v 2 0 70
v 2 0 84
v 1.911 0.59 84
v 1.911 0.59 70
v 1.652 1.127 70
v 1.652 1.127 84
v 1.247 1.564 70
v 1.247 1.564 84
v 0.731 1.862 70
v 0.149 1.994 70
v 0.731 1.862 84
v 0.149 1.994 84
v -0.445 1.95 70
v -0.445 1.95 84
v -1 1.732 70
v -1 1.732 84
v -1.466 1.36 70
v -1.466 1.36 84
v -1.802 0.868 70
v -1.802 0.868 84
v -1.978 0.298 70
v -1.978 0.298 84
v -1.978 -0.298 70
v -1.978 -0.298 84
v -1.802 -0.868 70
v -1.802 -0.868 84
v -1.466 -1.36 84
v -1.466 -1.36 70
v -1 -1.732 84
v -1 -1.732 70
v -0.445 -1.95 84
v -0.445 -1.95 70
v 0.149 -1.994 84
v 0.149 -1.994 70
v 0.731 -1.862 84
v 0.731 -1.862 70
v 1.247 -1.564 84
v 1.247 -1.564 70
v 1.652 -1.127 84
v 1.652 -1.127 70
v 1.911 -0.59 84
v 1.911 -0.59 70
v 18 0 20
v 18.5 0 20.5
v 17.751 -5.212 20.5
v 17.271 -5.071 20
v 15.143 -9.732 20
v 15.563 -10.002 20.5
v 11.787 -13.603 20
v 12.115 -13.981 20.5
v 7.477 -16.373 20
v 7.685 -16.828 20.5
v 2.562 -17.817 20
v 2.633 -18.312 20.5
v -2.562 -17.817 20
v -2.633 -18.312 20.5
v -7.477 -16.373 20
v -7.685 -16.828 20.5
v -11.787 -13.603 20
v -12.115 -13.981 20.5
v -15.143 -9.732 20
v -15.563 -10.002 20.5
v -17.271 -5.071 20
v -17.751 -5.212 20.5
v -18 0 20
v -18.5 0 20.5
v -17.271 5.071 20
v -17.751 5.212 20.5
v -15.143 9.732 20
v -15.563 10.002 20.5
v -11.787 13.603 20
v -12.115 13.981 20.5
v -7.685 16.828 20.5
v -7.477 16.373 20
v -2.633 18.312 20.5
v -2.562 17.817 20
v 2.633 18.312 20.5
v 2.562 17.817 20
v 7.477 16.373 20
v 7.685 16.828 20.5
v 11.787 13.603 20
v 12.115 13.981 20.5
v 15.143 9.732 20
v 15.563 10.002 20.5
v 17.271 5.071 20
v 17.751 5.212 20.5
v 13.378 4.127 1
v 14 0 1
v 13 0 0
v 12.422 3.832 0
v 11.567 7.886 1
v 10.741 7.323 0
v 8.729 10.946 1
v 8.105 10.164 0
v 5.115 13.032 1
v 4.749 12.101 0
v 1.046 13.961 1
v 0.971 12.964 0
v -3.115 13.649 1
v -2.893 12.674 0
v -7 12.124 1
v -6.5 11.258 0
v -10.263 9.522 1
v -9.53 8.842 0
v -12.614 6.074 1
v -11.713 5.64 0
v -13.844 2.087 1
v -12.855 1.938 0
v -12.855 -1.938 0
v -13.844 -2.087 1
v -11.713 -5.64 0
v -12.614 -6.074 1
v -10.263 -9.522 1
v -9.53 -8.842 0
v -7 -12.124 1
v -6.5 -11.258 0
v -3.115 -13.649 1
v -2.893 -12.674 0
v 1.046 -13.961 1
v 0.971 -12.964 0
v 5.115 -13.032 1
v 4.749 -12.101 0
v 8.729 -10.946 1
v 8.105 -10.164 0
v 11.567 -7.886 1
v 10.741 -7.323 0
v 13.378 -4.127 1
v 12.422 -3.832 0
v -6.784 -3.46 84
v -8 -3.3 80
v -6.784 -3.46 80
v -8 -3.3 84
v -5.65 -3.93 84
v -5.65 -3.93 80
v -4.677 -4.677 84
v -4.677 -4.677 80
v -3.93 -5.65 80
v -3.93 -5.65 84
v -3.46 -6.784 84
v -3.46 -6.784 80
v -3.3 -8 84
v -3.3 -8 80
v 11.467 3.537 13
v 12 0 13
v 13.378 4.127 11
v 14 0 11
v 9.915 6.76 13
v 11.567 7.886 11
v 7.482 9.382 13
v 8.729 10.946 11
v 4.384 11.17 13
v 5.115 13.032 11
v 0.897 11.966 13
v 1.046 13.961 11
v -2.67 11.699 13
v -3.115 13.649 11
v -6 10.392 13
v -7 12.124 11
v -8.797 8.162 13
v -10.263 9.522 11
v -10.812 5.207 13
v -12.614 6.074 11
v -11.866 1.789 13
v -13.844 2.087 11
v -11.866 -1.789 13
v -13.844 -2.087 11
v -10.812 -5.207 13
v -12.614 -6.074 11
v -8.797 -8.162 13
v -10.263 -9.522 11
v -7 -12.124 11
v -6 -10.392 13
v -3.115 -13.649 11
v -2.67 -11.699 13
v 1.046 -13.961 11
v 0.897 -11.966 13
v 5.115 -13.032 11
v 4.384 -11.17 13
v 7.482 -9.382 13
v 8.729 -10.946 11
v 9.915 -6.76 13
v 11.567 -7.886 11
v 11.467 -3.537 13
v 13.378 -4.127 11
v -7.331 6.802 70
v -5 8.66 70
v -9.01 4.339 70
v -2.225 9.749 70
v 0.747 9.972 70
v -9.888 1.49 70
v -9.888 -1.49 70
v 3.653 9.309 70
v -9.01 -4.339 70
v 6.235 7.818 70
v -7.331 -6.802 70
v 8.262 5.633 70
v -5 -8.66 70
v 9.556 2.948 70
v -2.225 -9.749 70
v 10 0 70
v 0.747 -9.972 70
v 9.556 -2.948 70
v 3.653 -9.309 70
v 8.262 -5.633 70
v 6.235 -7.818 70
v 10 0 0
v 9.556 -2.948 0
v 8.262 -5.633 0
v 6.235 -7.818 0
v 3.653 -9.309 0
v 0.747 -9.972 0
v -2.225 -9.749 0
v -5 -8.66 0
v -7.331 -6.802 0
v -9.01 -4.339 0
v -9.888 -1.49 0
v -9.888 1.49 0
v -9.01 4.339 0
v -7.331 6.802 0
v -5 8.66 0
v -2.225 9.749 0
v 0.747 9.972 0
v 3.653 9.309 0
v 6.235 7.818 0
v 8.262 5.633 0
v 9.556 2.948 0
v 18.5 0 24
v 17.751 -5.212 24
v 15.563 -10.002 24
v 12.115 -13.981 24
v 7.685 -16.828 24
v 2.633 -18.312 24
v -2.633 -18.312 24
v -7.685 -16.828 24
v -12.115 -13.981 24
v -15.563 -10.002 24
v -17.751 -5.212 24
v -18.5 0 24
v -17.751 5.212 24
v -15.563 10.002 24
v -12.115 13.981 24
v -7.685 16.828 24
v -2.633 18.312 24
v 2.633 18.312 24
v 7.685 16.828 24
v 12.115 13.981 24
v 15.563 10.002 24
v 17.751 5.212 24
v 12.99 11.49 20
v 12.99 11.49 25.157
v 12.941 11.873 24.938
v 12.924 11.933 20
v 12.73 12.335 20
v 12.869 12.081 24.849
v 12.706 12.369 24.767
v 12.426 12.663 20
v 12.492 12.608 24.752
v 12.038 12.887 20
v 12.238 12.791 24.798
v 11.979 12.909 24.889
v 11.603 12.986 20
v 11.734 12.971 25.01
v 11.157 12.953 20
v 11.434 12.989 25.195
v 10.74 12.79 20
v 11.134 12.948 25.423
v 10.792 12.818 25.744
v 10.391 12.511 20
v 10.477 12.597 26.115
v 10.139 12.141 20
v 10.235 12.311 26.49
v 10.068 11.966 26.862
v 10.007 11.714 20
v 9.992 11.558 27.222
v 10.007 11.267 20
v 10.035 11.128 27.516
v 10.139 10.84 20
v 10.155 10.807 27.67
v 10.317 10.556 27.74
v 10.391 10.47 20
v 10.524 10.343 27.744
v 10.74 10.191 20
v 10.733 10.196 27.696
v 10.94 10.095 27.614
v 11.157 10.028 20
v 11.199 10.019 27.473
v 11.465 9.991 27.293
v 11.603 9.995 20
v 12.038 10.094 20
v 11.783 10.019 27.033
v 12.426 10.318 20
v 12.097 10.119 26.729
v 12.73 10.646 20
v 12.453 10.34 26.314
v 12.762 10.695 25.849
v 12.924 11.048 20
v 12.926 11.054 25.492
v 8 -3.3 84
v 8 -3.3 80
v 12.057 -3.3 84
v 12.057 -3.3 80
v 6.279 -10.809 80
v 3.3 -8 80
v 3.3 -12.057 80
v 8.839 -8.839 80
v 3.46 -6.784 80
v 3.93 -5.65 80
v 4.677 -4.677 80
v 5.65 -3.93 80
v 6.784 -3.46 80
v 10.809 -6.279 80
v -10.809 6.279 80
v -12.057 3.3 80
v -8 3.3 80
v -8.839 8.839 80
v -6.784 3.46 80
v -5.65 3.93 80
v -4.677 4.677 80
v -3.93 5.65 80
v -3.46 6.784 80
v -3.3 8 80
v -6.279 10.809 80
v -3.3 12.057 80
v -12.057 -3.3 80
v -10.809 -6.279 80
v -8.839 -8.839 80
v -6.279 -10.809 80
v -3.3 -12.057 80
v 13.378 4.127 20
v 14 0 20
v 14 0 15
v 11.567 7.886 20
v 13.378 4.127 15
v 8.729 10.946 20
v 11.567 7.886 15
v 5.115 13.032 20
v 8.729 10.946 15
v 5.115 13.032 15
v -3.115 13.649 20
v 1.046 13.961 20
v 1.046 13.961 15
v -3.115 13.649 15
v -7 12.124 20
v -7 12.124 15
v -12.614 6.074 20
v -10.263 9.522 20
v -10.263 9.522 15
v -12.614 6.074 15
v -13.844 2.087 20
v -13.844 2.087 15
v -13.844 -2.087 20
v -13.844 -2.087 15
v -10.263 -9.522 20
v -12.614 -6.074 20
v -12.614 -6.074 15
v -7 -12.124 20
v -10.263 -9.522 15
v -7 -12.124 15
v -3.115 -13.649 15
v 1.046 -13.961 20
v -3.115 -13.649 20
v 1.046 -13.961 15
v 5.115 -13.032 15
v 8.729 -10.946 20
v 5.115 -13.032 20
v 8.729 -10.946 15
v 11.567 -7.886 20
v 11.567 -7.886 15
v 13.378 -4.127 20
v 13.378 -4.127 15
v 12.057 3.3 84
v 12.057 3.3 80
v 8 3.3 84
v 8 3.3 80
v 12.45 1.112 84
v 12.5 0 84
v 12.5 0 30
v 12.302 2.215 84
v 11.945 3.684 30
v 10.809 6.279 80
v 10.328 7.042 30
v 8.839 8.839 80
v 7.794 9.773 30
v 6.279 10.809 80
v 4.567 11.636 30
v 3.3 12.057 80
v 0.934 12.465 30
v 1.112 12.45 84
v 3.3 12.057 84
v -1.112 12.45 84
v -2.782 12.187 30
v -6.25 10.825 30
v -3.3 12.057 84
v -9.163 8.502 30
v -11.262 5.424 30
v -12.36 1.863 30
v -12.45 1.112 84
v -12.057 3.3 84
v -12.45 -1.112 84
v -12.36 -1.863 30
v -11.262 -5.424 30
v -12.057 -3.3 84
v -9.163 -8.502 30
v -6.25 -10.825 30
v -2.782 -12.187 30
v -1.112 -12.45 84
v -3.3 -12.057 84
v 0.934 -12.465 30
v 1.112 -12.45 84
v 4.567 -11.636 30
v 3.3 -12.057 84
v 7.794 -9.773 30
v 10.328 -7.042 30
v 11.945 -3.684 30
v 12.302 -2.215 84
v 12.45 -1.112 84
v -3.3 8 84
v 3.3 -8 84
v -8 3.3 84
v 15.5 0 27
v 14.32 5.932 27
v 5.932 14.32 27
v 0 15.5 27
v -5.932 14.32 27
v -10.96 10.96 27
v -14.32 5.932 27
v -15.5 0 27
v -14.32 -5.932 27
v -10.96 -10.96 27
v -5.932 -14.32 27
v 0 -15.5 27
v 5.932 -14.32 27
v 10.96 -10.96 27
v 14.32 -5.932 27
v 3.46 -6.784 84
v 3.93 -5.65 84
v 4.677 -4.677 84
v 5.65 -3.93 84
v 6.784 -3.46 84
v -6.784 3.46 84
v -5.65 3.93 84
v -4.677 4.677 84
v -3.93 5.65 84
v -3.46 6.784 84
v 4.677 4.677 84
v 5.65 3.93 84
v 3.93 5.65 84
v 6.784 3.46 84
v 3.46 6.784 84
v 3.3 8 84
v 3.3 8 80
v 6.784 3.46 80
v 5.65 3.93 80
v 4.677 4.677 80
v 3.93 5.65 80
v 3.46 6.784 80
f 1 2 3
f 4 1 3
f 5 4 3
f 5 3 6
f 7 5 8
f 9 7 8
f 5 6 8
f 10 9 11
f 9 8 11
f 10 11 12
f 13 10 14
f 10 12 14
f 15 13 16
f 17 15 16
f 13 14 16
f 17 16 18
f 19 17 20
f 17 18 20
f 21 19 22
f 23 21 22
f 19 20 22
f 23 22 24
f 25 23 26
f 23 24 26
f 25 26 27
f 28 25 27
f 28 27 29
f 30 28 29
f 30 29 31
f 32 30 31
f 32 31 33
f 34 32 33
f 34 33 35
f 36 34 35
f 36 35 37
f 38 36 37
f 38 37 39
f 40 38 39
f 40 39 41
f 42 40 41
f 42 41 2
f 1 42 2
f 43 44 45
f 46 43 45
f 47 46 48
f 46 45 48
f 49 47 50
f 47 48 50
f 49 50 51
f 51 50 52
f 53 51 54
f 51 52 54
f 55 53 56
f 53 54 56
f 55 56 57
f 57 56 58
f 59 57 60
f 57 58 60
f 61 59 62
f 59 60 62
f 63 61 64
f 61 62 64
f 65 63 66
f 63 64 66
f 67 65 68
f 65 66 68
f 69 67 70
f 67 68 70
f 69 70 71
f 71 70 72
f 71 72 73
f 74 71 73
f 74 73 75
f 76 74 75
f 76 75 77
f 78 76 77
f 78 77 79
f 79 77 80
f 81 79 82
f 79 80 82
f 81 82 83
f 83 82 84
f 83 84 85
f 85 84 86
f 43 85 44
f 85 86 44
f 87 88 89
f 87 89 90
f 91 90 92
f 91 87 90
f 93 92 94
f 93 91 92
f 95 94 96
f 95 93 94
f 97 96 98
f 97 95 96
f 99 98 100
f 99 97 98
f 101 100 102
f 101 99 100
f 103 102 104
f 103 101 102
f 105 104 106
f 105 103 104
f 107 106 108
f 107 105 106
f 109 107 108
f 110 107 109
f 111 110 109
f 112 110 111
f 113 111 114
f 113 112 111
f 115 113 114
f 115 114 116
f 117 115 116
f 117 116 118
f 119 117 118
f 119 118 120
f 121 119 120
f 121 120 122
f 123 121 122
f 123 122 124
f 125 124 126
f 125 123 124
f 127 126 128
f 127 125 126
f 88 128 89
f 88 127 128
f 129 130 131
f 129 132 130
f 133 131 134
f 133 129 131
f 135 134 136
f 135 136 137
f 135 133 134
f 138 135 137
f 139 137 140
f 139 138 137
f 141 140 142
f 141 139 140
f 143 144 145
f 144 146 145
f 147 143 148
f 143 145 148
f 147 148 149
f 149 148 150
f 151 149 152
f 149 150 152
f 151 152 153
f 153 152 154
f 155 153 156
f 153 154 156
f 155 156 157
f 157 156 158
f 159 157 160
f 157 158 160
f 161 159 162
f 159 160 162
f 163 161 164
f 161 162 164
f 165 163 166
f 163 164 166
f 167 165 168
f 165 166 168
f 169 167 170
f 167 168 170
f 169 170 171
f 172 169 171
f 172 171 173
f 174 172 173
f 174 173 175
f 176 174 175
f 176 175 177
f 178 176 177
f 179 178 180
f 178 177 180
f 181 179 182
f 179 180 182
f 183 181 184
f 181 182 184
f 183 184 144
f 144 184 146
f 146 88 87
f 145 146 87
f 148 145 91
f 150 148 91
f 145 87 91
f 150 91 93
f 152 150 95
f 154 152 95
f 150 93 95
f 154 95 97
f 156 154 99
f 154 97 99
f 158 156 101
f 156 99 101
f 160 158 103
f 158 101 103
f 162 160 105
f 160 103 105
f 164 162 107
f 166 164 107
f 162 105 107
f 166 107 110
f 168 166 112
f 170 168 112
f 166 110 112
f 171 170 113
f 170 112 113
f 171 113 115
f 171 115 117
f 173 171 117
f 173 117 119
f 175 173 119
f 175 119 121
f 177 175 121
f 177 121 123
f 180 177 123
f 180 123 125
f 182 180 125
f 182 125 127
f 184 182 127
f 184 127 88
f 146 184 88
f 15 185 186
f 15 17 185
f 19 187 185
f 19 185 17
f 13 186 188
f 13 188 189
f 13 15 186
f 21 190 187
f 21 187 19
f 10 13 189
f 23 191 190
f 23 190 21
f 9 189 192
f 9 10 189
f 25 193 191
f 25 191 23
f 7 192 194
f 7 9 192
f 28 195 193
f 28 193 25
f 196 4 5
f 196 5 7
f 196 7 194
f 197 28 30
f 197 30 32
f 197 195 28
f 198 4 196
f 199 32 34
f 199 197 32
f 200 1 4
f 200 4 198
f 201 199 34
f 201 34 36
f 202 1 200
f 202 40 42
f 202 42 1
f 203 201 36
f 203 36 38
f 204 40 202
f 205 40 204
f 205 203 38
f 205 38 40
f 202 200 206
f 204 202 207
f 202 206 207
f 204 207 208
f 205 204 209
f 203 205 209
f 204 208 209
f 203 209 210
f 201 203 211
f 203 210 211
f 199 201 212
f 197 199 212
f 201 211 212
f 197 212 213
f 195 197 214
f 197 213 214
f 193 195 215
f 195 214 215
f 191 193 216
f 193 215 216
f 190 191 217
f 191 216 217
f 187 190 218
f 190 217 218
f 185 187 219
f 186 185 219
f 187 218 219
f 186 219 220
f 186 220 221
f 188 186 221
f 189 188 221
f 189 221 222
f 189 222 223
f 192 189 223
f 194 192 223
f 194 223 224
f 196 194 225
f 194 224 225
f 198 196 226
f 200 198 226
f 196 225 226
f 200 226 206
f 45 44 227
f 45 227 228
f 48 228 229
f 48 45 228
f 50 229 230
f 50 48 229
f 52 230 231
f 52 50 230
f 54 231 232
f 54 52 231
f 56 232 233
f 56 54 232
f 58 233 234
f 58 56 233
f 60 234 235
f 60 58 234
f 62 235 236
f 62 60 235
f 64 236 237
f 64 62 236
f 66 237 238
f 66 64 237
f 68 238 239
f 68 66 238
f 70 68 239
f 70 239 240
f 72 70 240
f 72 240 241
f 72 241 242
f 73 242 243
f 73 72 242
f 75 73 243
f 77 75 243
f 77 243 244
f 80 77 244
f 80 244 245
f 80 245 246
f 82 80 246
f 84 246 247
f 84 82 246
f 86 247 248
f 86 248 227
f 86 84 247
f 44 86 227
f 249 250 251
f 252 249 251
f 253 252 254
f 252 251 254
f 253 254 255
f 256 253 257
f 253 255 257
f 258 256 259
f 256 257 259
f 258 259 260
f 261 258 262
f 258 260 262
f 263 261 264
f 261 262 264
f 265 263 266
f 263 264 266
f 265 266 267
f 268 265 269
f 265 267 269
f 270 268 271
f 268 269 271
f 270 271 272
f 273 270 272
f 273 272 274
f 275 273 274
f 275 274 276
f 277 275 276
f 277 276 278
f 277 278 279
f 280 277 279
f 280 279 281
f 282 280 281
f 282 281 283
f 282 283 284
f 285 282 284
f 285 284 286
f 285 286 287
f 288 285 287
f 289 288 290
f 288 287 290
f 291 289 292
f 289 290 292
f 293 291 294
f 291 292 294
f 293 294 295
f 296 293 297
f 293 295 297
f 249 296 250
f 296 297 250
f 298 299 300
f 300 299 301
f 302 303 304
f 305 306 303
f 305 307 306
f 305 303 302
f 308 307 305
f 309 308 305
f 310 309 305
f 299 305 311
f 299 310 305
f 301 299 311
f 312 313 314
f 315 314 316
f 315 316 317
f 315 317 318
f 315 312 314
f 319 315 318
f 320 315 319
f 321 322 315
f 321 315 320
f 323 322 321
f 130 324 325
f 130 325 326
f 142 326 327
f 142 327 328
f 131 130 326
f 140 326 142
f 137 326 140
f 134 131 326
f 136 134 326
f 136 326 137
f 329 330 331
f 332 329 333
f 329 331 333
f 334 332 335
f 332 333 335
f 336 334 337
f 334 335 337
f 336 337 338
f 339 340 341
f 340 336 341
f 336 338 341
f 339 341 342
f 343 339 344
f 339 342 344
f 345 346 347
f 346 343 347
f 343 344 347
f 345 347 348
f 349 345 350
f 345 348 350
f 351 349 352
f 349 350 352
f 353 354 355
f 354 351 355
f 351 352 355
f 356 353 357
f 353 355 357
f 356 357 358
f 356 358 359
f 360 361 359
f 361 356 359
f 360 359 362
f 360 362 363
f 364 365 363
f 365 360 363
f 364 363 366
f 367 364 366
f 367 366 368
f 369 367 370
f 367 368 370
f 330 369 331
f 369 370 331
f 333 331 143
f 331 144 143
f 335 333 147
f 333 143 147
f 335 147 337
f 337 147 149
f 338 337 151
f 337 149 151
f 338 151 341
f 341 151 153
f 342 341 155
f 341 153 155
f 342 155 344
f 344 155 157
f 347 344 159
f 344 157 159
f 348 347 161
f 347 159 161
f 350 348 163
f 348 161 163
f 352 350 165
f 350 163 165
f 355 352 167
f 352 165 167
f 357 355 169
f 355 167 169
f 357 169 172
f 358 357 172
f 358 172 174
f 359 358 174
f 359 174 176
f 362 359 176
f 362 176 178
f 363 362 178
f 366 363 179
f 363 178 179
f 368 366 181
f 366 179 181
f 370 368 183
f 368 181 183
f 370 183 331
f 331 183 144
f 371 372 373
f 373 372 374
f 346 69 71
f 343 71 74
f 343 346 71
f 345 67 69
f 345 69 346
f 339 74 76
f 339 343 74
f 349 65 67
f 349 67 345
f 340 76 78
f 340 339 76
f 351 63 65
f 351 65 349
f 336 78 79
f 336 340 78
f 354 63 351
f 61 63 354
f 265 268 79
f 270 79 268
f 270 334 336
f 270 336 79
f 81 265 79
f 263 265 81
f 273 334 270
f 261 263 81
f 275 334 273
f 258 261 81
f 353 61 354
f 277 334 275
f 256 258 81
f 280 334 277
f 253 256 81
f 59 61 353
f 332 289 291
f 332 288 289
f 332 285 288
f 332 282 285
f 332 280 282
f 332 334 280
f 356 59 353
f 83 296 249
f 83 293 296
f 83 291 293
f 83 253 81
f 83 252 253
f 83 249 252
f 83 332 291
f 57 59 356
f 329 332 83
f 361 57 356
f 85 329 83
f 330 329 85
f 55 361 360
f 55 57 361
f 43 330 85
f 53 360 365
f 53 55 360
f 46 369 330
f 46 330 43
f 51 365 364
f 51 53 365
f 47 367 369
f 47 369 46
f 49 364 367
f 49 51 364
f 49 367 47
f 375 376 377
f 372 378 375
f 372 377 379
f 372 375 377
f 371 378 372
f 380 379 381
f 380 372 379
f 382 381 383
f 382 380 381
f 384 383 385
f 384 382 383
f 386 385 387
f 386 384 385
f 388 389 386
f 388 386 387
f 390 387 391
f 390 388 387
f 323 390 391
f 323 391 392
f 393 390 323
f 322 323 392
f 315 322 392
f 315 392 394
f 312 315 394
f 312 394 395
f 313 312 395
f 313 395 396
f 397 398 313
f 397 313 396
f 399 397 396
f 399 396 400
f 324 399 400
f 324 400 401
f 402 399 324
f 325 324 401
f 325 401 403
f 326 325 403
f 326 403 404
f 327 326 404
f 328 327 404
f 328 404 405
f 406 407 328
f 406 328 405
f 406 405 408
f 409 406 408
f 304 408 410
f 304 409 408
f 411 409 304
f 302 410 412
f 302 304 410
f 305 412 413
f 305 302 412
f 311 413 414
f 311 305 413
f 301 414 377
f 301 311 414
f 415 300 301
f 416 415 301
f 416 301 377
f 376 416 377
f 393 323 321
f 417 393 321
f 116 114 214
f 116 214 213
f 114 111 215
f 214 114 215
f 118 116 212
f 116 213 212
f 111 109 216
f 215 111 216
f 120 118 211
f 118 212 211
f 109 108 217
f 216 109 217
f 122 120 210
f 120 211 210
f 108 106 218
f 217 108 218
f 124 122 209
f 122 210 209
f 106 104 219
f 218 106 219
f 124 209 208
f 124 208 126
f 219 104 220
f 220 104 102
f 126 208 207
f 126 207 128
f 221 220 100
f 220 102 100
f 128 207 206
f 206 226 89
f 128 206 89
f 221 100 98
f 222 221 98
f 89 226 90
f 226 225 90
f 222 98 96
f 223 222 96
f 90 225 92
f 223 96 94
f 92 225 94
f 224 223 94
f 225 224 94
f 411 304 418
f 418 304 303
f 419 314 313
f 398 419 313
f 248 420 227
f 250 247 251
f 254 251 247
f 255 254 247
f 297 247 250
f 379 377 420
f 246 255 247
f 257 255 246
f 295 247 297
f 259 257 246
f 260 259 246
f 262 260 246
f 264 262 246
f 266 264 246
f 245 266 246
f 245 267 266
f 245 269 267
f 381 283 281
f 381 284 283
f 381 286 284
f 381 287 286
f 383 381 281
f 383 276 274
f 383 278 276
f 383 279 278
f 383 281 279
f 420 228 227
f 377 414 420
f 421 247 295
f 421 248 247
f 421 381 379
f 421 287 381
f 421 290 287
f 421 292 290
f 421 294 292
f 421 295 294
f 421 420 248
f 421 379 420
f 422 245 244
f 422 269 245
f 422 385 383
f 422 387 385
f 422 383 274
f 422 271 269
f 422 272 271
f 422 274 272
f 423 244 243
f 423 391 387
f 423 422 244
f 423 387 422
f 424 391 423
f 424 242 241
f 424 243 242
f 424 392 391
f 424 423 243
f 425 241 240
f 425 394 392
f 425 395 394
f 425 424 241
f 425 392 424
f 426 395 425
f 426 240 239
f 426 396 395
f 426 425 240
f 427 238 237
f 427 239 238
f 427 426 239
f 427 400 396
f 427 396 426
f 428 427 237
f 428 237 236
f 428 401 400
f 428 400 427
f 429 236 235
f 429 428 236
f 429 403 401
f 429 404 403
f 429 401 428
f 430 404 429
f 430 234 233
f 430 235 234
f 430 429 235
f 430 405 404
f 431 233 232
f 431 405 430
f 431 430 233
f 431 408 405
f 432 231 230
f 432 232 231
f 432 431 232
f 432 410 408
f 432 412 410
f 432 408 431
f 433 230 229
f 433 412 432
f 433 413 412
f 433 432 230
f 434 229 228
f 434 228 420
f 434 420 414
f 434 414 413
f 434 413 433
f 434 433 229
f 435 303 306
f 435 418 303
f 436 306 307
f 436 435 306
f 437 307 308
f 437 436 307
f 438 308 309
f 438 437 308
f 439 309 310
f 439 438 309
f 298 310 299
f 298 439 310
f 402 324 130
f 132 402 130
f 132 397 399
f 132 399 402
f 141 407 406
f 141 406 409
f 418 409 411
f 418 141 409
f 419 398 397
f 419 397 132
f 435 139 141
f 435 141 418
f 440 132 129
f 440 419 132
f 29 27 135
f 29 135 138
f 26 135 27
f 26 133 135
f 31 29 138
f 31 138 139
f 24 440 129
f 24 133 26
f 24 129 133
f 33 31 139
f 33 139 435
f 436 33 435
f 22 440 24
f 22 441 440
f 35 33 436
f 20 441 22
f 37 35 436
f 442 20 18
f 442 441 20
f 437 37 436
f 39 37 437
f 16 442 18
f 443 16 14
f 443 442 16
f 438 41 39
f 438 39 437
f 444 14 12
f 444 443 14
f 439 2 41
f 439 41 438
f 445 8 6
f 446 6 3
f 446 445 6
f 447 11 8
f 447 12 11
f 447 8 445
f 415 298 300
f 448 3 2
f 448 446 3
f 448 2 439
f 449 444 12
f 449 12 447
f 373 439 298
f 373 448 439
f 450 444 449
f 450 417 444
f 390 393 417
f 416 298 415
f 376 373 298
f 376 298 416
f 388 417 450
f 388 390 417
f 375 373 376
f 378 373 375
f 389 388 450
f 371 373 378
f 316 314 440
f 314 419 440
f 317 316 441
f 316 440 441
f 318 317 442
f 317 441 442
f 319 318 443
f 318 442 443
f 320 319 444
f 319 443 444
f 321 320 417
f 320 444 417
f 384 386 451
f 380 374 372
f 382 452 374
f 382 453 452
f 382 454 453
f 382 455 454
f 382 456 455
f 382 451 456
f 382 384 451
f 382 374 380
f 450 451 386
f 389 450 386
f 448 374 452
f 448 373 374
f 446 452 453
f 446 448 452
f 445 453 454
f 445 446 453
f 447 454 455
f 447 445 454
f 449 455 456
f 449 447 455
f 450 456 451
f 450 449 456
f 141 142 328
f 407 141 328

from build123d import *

# Parameters (mm, degrees)
F0_R         = 14
F1_DEPTH     = 80
F3_R         = 18.5
F4_DEPTH     = 4
F8_DEPTH     = 4
F9_R         = 4.7
F10_R        = 2
F11_DEPTH    = 84.001
F12_R        = 10
F12_R_2      = 2
F13_DEPTH    = 70
F14_SIZE     = 1
F15_SIZE     = 0.5
F16_R        = 1.5
F17_DEPTH    = 25
F18_R        = 14
F18_R_2      = 12.5
F19_DEPTH    = 60
F20_S5_R     = 1.5
F20_T6_DEPTH = 28
F20_S7_R     = 18.5
F20_T8_DEPTH = 28


# Not quite as in the source:
# - a fillet or chamfer that OpenCascade refuses, or shapes differently, is made with other operations: its cross-section is extruded or revolved along the edge and cut away or added


with BuildPart() as f1:
    # F0 (on Top) → F1 (new body)
    with BuildSketch(Plane.XY):
        Circle(F0_R)
    extrude(amount=F1_DEPTH)

    # F3 (on offset) → F4 (join)
    with BuildSketch(Plane(origin=(0, 0, 20), x_dir=(1, 0, 0), z_dir=(0, 0, -1))):
        Circle(F3_R)
    extrude(amount=-F4_DEPTH)

    # F5 (on Front) → F6 (revolve, cut)
    with BuildSketch(Plane.XZ):
        Polygon((14, 15), (12, 13), (14, 11), align=None)
    revolve(axis=Axis((0, 0, 15.3274592012), (0, 0, 1)), mode=Mode.SUBTRACT)

    # F7 (on face) → F8 (join)
    with BuildSketch(Plane.XY.offset(80)):
        with BuildLine():
            Line((-3.3, -3.3), (-3.3, 0))
            Line((-3.3, 0), (-3.3, 3.3))
            Line((-3.3, 3.3), (-13.6055135882, 3.3))
            ThreePointArc((-13.6055135882, 3.3), (-14, 0), (-13.6055135882, -3.3))
            Line((-13.6055135882, -3.3), (-3.3, -3.3))
        make_face()
        Polygon((-3.3, 3.3), (-3.3, 0), (-3.3, -3.3), (0, -3.3), (3.3, -3.3), (3.3, 0), (3.3, 3.3), (0, 3.3), align=None)
        with BuildLine():
            Line((-3.3, 13.6055135882), (-3.3, 3.3))
            Line((-3.3, 3.3), (0, 3.3))
            Line((0, 3.3), (3.3, 3.3))
            Line((3.3, 3.3), (3.3, 13.6055135882))
            ThreePointArc((3.3, 13.6055135882), (0, 14), (-3.3, 13.6055135882))
        make_face()
        with BuildLine():
            Line((0, -3.3), (-3.3, -3.3))
            Line((-3.3, -3.3), (-3.3, -13.6055135882))
            ThreePointArc((-3.3, -13.6055135882), (0, -14), (3.3, -13.6055135882))
            Line((3.3, -13.6055135882), (3.3, -3.3))
            Line((3.3, -3.3), (0, -3.3))
        make_face()
        with BuildLine():
            Line((13.6055135882, 3.3), (3.3, 3.3))
            Line((3.3, 3.3), (3.3, 0))
            Line((3.3, 0), (3.3, -3.3))
            Line((3.3, -3.3), (13.6055135882, -3.3))
            ThreePointArc((13.6055135882, -3.3), (14, 0), (13.6055135882, 3.3))
        make_face()
    extrude(amount=F8_DEPTH)

    # F9
    f9_edges = [f1.edges().sort_by_distance(p)[0] for p in [
        (-3.3, 3.3, 82),
        (3.3, 3.3, 82),
        (3.3, -3.3, 82),
        (-3.3, -3.3, 82),
    ]]
    fillet(f9_edges, radius=F9_R)

    # F10 (on face) → F11 (cut, through all)
    with BuildSketch(Plane.XY.offset(84)):
        Circle(F10_R)
    extrude(amount=-F11_DEPTH, mode=Mode.SUBTRACT)

    # F12 (on face) + F8_face1 (on face) → F13 (cut)
    with BuildSketch(Plane(origin=(0, 0, 0), x_dir=(1, 0, 0), z_dir=(0, 0, -1))):
        Circle(F12_R)
        Circle(F12_R_2, mode=Mode.SUBTRACT)
        Circle(F12_R)
    with BuildSketch(Plane(origin=(-7.5775327369, -7.5775327369, 80), x_dir=(1, 0, 0), z_dir=(0, 0, 1))):
        with BuildLine():
            Line((-0.4224672631, 4.2775327369), (-6.0279808513, 4.2775327369))
            ThreePointArc((-6.0279808513, 4.2775327369), (-2.3219621997, -2.3219621997), (4.2775327369, -6.0279808513))
            Line((4.2775327369, -6.0279808513), (4.2775327369, -0.4224672631))
            ThreePointArc((4.2775327369, -0.4224672631), (2.9009346085, 2.9009346085), (-0.4224672631, 4.2775327369))
        make_face()
    extrude(amount=-F13_DEPTH, dir=(0, 0, -1), mode=Mode.SUBTRACT)

    # F14
    f14_edges = [f1.edges().sort_by_distance(p)[0] for p in [
        (-14, 0, 0),
    ]]
    chamfer(f14_edges, length=F14_SIZE)

    # F15
    f15_edges = [f1.edges().sort_by_distance(p)[0] for p in [
        (-18.5, 0, 20),
    ]]
    chamfer(f15_edges, length=F15_SIZE)

    # F16 (on face) → F17 (cut)
    with BuildSketch(Plane(origin=(0, 0, 20), x_dir=(1, 0, 0), z_dir=(0, 0, -1))):
        with Locations((11.4904851943, -11.4904851943)):
            Circle(F16_R)
    extrude(amount=-F17_DEPTH, mode=Mode.SUBTRACT)

    # F18 (on face) → F19 (cut, through all)
    with BuildSketch(Plane.XY.offset(84)):
        Circle(F18_R)
        Circle(F18_R_2, mode=Mode.SUBTRACT)
    extrude(amount=-F19_DEPTH, mode=Mode.SUBTRACT)

    # F20: chamfer of 6 on 1 edges, made by hand


with BuildPart() as f20_tool2:
    # F20_s3 → F20_t4 (revolve)
    with BuildSketch(Plane.XZ):
        Polygon((18.5, 24), (12.5, 30), (12.5, 24), align=None)
    revolve(axis=Axis((0, 0, 24), (0, 0, 1)))

    # F20_s5 → F20_t6 (cut, symmetric)
    with BuildSketch(Plane.XY.offset(27)):
        with Locations((11.4904851943, 11.4904851943)):
            Circle(F20_S5_R)
    extrude(amount=F20_T6_DEPTH, both=True, mode=Mode.SUBTRACT)

    # F20_s7 → F20_t8 (intersect, symmetric)
    with BuildSketch(Plane.XY.offset(27)):
        Circle(F20_S7_R)
    extrude(amount=F20_T8_DEPTH, both=True, mode=Mode.INTERSECT)


with BuildPart() as f1_1:
    add(f1.part)

    # F20_t1: union F20_tool2
    add(f20_tool2.part)


solid = f1_1.part
